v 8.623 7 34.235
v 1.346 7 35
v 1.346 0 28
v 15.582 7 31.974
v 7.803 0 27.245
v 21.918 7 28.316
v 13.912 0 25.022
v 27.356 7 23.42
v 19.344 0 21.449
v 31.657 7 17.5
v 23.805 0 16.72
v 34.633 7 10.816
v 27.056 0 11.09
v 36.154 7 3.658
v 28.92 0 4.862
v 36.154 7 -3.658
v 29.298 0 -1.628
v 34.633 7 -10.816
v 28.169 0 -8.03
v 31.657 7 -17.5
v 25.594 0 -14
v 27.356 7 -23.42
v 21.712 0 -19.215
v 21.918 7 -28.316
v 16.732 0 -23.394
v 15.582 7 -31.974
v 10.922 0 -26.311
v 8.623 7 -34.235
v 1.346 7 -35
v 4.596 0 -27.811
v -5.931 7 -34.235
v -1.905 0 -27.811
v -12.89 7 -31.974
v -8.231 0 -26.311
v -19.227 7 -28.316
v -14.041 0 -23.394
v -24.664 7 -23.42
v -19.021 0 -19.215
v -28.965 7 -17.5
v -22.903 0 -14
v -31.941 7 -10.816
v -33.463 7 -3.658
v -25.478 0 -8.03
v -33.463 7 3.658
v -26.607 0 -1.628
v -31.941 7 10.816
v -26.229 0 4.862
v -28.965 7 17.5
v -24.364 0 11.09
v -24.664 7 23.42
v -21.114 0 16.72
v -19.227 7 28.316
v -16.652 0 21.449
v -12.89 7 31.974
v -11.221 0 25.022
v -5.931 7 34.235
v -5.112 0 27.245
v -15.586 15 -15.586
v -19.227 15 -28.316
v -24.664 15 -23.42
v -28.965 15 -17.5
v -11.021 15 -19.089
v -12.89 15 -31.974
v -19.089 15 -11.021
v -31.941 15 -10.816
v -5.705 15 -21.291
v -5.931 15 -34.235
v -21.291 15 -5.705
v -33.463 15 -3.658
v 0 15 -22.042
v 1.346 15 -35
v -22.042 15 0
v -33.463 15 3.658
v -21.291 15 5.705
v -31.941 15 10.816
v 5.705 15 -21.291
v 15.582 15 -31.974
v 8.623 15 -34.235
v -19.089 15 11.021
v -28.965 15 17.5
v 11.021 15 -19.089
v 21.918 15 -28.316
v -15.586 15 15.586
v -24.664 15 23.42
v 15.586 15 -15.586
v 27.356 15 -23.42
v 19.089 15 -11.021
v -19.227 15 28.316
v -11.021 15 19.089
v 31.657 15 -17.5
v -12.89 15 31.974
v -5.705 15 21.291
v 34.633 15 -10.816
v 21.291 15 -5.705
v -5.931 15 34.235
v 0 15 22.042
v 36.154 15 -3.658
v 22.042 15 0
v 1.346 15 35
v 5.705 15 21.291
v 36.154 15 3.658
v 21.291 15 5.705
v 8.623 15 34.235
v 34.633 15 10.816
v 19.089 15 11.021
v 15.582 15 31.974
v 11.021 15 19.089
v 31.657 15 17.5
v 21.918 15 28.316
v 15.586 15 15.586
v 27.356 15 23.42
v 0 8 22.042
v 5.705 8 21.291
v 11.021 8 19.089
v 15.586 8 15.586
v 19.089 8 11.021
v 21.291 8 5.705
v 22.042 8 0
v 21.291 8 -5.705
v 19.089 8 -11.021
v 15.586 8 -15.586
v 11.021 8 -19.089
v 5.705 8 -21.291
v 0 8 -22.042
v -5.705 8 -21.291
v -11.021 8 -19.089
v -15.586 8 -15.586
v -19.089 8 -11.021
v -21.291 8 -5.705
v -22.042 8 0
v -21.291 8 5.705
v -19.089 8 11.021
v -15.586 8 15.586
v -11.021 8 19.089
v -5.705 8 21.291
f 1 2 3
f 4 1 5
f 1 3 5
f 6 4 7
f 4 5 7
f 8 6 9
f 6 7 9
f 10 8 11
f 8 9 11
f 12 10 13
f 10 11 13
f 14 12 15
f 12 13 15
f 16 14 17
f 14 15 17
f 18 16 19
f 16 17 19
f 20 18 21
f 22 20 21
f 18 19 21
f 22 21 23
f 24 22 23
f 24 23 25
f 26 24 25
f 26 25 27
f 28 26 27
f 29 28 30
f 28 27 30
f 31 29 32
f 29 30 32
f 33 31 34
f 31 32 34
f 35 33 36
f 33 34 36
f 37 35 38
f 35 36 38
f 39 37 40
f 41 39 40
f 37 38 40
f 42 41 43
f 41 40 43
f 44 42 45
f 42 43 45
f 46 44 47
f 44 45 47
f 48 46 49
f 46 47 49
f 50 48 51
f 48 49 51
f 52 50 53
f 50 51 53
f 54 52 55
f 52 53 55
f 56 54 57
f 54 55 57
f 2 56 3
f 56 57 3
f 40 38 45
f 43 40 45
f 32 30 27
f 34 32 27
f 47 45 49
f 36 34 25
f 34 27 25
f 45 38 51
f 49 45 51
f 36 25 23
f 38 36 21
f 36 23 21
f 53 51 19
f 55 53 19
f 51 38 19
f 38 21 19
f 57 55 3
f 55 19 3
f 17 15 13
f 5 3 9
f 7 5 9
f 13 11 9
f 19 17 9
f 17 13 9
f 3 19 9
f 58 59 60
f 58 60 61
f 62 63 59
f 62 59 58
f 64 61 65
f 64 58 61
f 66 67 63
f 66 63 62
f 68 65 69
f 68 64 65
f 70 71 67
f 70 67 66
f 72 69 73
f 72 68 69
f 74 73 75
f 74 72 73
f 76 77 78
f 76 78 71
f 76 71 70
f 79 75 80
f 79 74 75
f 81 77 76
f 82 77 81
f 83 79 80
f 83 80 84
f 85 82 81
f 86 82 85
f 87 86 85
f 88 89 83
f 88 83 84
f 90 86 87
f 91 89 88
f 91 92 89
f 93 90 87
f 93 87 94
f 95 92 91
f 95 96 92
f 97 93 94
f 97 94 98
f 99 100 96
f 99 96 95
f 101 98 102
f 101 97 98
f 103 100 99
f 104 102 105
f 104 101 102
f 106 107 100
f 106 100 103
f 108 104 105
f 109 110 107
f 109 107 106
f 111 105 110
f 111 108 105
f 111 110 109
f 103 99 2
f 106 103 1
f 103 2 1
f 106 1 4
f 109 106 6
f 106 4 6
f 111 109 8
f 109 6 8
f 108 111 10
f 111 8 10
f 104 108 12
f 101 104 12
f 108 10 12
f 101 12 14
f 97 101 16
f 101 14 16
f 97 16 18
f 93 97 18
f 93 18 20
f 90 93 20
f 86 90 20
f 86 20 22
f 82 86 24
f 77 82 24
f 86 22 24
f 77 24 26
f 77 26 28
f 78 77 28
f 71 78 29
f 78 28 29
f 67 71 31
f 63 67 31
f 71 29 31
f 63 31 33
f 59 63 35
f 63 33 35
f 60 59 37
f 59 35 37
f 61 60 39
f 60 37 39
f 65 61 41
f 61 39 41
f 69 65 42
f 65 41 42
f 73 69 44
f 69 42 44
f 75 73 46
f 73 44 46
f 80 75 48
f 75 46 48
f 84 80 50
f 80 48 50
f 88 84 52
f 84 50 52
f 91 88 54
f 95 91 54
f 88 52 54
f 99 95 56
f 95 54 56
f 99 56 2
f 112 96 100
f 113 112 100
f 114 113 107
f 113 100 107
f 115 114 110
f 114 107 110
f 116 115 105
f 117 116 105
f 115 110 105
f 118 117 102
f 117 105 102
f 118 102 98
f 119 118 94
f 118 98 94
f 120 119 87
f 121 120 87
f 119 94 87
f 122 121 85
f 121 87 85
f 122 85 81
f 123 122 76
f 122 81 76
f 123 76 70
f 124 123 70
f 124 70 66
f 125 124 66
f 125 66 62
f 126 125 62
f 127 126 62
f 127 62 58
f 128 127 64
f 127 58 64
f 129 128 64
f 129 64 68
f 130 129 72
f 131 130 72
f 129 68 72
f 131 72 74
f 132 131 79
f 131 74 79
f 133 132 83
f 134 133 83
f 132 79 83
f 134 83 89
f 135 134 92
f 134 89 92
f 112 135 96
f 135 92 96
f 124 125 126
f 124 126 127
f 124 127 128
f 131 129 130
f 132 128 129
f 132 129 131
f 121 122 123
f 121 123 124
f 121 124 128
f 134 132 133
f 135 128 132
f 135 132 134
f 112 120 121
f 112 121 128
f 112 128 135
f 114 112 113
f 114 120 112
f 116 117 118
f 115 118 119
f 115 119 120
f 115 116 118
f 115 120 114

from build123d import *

# Parameters (mm, degrees)
SKETCH1_R           = 35
BOSS_EXTRUDE1_DEPTH = 15
CHAMFER2_SIZE       = 7
SKETCH2_R           = 22.041880944
CUT_EXTRUDE1_DEPTH  = 7


with BuildPart() as part:
    # Sketch1 → Boss-Extrude1 (new body)
    with BuildSketch(Plane(origin=(0, 0, 0), x_dir=(1, 0, 0), z_dir=(0, 1, 0))):
        with Locations(Location((1.345738872, 0, 0), (0, 0, 270))):
            Circle(SKETCH1_R)
    extrude(amount=BOSS_EXTRUDE1_DEPTH)

    # Chamfer2
    chamfer2_edges = [part.edges().sort_by_distance(p)[0] for p in [
        (1.345738872, 0, -35),
    ]]
    chamfer(chamfer2_edges, length=CHAMFER2_SIZE)

    # Sketch2 → Cut-Extrude1 (cut)
    with BuildSketch(Plane(origin=(0, 15, 0), x_dir=(1, 0, 0), z_dir=(0, 1, 0))):
        with Locations(Location((0, 0, 0), (0, 0, 270))):
            Circle(SKETCH2_R)
    extrude(amount=-CUT_EXTRUDE1_DEPTH, mode=Mode.SUBTRACT)


solid = part.part
